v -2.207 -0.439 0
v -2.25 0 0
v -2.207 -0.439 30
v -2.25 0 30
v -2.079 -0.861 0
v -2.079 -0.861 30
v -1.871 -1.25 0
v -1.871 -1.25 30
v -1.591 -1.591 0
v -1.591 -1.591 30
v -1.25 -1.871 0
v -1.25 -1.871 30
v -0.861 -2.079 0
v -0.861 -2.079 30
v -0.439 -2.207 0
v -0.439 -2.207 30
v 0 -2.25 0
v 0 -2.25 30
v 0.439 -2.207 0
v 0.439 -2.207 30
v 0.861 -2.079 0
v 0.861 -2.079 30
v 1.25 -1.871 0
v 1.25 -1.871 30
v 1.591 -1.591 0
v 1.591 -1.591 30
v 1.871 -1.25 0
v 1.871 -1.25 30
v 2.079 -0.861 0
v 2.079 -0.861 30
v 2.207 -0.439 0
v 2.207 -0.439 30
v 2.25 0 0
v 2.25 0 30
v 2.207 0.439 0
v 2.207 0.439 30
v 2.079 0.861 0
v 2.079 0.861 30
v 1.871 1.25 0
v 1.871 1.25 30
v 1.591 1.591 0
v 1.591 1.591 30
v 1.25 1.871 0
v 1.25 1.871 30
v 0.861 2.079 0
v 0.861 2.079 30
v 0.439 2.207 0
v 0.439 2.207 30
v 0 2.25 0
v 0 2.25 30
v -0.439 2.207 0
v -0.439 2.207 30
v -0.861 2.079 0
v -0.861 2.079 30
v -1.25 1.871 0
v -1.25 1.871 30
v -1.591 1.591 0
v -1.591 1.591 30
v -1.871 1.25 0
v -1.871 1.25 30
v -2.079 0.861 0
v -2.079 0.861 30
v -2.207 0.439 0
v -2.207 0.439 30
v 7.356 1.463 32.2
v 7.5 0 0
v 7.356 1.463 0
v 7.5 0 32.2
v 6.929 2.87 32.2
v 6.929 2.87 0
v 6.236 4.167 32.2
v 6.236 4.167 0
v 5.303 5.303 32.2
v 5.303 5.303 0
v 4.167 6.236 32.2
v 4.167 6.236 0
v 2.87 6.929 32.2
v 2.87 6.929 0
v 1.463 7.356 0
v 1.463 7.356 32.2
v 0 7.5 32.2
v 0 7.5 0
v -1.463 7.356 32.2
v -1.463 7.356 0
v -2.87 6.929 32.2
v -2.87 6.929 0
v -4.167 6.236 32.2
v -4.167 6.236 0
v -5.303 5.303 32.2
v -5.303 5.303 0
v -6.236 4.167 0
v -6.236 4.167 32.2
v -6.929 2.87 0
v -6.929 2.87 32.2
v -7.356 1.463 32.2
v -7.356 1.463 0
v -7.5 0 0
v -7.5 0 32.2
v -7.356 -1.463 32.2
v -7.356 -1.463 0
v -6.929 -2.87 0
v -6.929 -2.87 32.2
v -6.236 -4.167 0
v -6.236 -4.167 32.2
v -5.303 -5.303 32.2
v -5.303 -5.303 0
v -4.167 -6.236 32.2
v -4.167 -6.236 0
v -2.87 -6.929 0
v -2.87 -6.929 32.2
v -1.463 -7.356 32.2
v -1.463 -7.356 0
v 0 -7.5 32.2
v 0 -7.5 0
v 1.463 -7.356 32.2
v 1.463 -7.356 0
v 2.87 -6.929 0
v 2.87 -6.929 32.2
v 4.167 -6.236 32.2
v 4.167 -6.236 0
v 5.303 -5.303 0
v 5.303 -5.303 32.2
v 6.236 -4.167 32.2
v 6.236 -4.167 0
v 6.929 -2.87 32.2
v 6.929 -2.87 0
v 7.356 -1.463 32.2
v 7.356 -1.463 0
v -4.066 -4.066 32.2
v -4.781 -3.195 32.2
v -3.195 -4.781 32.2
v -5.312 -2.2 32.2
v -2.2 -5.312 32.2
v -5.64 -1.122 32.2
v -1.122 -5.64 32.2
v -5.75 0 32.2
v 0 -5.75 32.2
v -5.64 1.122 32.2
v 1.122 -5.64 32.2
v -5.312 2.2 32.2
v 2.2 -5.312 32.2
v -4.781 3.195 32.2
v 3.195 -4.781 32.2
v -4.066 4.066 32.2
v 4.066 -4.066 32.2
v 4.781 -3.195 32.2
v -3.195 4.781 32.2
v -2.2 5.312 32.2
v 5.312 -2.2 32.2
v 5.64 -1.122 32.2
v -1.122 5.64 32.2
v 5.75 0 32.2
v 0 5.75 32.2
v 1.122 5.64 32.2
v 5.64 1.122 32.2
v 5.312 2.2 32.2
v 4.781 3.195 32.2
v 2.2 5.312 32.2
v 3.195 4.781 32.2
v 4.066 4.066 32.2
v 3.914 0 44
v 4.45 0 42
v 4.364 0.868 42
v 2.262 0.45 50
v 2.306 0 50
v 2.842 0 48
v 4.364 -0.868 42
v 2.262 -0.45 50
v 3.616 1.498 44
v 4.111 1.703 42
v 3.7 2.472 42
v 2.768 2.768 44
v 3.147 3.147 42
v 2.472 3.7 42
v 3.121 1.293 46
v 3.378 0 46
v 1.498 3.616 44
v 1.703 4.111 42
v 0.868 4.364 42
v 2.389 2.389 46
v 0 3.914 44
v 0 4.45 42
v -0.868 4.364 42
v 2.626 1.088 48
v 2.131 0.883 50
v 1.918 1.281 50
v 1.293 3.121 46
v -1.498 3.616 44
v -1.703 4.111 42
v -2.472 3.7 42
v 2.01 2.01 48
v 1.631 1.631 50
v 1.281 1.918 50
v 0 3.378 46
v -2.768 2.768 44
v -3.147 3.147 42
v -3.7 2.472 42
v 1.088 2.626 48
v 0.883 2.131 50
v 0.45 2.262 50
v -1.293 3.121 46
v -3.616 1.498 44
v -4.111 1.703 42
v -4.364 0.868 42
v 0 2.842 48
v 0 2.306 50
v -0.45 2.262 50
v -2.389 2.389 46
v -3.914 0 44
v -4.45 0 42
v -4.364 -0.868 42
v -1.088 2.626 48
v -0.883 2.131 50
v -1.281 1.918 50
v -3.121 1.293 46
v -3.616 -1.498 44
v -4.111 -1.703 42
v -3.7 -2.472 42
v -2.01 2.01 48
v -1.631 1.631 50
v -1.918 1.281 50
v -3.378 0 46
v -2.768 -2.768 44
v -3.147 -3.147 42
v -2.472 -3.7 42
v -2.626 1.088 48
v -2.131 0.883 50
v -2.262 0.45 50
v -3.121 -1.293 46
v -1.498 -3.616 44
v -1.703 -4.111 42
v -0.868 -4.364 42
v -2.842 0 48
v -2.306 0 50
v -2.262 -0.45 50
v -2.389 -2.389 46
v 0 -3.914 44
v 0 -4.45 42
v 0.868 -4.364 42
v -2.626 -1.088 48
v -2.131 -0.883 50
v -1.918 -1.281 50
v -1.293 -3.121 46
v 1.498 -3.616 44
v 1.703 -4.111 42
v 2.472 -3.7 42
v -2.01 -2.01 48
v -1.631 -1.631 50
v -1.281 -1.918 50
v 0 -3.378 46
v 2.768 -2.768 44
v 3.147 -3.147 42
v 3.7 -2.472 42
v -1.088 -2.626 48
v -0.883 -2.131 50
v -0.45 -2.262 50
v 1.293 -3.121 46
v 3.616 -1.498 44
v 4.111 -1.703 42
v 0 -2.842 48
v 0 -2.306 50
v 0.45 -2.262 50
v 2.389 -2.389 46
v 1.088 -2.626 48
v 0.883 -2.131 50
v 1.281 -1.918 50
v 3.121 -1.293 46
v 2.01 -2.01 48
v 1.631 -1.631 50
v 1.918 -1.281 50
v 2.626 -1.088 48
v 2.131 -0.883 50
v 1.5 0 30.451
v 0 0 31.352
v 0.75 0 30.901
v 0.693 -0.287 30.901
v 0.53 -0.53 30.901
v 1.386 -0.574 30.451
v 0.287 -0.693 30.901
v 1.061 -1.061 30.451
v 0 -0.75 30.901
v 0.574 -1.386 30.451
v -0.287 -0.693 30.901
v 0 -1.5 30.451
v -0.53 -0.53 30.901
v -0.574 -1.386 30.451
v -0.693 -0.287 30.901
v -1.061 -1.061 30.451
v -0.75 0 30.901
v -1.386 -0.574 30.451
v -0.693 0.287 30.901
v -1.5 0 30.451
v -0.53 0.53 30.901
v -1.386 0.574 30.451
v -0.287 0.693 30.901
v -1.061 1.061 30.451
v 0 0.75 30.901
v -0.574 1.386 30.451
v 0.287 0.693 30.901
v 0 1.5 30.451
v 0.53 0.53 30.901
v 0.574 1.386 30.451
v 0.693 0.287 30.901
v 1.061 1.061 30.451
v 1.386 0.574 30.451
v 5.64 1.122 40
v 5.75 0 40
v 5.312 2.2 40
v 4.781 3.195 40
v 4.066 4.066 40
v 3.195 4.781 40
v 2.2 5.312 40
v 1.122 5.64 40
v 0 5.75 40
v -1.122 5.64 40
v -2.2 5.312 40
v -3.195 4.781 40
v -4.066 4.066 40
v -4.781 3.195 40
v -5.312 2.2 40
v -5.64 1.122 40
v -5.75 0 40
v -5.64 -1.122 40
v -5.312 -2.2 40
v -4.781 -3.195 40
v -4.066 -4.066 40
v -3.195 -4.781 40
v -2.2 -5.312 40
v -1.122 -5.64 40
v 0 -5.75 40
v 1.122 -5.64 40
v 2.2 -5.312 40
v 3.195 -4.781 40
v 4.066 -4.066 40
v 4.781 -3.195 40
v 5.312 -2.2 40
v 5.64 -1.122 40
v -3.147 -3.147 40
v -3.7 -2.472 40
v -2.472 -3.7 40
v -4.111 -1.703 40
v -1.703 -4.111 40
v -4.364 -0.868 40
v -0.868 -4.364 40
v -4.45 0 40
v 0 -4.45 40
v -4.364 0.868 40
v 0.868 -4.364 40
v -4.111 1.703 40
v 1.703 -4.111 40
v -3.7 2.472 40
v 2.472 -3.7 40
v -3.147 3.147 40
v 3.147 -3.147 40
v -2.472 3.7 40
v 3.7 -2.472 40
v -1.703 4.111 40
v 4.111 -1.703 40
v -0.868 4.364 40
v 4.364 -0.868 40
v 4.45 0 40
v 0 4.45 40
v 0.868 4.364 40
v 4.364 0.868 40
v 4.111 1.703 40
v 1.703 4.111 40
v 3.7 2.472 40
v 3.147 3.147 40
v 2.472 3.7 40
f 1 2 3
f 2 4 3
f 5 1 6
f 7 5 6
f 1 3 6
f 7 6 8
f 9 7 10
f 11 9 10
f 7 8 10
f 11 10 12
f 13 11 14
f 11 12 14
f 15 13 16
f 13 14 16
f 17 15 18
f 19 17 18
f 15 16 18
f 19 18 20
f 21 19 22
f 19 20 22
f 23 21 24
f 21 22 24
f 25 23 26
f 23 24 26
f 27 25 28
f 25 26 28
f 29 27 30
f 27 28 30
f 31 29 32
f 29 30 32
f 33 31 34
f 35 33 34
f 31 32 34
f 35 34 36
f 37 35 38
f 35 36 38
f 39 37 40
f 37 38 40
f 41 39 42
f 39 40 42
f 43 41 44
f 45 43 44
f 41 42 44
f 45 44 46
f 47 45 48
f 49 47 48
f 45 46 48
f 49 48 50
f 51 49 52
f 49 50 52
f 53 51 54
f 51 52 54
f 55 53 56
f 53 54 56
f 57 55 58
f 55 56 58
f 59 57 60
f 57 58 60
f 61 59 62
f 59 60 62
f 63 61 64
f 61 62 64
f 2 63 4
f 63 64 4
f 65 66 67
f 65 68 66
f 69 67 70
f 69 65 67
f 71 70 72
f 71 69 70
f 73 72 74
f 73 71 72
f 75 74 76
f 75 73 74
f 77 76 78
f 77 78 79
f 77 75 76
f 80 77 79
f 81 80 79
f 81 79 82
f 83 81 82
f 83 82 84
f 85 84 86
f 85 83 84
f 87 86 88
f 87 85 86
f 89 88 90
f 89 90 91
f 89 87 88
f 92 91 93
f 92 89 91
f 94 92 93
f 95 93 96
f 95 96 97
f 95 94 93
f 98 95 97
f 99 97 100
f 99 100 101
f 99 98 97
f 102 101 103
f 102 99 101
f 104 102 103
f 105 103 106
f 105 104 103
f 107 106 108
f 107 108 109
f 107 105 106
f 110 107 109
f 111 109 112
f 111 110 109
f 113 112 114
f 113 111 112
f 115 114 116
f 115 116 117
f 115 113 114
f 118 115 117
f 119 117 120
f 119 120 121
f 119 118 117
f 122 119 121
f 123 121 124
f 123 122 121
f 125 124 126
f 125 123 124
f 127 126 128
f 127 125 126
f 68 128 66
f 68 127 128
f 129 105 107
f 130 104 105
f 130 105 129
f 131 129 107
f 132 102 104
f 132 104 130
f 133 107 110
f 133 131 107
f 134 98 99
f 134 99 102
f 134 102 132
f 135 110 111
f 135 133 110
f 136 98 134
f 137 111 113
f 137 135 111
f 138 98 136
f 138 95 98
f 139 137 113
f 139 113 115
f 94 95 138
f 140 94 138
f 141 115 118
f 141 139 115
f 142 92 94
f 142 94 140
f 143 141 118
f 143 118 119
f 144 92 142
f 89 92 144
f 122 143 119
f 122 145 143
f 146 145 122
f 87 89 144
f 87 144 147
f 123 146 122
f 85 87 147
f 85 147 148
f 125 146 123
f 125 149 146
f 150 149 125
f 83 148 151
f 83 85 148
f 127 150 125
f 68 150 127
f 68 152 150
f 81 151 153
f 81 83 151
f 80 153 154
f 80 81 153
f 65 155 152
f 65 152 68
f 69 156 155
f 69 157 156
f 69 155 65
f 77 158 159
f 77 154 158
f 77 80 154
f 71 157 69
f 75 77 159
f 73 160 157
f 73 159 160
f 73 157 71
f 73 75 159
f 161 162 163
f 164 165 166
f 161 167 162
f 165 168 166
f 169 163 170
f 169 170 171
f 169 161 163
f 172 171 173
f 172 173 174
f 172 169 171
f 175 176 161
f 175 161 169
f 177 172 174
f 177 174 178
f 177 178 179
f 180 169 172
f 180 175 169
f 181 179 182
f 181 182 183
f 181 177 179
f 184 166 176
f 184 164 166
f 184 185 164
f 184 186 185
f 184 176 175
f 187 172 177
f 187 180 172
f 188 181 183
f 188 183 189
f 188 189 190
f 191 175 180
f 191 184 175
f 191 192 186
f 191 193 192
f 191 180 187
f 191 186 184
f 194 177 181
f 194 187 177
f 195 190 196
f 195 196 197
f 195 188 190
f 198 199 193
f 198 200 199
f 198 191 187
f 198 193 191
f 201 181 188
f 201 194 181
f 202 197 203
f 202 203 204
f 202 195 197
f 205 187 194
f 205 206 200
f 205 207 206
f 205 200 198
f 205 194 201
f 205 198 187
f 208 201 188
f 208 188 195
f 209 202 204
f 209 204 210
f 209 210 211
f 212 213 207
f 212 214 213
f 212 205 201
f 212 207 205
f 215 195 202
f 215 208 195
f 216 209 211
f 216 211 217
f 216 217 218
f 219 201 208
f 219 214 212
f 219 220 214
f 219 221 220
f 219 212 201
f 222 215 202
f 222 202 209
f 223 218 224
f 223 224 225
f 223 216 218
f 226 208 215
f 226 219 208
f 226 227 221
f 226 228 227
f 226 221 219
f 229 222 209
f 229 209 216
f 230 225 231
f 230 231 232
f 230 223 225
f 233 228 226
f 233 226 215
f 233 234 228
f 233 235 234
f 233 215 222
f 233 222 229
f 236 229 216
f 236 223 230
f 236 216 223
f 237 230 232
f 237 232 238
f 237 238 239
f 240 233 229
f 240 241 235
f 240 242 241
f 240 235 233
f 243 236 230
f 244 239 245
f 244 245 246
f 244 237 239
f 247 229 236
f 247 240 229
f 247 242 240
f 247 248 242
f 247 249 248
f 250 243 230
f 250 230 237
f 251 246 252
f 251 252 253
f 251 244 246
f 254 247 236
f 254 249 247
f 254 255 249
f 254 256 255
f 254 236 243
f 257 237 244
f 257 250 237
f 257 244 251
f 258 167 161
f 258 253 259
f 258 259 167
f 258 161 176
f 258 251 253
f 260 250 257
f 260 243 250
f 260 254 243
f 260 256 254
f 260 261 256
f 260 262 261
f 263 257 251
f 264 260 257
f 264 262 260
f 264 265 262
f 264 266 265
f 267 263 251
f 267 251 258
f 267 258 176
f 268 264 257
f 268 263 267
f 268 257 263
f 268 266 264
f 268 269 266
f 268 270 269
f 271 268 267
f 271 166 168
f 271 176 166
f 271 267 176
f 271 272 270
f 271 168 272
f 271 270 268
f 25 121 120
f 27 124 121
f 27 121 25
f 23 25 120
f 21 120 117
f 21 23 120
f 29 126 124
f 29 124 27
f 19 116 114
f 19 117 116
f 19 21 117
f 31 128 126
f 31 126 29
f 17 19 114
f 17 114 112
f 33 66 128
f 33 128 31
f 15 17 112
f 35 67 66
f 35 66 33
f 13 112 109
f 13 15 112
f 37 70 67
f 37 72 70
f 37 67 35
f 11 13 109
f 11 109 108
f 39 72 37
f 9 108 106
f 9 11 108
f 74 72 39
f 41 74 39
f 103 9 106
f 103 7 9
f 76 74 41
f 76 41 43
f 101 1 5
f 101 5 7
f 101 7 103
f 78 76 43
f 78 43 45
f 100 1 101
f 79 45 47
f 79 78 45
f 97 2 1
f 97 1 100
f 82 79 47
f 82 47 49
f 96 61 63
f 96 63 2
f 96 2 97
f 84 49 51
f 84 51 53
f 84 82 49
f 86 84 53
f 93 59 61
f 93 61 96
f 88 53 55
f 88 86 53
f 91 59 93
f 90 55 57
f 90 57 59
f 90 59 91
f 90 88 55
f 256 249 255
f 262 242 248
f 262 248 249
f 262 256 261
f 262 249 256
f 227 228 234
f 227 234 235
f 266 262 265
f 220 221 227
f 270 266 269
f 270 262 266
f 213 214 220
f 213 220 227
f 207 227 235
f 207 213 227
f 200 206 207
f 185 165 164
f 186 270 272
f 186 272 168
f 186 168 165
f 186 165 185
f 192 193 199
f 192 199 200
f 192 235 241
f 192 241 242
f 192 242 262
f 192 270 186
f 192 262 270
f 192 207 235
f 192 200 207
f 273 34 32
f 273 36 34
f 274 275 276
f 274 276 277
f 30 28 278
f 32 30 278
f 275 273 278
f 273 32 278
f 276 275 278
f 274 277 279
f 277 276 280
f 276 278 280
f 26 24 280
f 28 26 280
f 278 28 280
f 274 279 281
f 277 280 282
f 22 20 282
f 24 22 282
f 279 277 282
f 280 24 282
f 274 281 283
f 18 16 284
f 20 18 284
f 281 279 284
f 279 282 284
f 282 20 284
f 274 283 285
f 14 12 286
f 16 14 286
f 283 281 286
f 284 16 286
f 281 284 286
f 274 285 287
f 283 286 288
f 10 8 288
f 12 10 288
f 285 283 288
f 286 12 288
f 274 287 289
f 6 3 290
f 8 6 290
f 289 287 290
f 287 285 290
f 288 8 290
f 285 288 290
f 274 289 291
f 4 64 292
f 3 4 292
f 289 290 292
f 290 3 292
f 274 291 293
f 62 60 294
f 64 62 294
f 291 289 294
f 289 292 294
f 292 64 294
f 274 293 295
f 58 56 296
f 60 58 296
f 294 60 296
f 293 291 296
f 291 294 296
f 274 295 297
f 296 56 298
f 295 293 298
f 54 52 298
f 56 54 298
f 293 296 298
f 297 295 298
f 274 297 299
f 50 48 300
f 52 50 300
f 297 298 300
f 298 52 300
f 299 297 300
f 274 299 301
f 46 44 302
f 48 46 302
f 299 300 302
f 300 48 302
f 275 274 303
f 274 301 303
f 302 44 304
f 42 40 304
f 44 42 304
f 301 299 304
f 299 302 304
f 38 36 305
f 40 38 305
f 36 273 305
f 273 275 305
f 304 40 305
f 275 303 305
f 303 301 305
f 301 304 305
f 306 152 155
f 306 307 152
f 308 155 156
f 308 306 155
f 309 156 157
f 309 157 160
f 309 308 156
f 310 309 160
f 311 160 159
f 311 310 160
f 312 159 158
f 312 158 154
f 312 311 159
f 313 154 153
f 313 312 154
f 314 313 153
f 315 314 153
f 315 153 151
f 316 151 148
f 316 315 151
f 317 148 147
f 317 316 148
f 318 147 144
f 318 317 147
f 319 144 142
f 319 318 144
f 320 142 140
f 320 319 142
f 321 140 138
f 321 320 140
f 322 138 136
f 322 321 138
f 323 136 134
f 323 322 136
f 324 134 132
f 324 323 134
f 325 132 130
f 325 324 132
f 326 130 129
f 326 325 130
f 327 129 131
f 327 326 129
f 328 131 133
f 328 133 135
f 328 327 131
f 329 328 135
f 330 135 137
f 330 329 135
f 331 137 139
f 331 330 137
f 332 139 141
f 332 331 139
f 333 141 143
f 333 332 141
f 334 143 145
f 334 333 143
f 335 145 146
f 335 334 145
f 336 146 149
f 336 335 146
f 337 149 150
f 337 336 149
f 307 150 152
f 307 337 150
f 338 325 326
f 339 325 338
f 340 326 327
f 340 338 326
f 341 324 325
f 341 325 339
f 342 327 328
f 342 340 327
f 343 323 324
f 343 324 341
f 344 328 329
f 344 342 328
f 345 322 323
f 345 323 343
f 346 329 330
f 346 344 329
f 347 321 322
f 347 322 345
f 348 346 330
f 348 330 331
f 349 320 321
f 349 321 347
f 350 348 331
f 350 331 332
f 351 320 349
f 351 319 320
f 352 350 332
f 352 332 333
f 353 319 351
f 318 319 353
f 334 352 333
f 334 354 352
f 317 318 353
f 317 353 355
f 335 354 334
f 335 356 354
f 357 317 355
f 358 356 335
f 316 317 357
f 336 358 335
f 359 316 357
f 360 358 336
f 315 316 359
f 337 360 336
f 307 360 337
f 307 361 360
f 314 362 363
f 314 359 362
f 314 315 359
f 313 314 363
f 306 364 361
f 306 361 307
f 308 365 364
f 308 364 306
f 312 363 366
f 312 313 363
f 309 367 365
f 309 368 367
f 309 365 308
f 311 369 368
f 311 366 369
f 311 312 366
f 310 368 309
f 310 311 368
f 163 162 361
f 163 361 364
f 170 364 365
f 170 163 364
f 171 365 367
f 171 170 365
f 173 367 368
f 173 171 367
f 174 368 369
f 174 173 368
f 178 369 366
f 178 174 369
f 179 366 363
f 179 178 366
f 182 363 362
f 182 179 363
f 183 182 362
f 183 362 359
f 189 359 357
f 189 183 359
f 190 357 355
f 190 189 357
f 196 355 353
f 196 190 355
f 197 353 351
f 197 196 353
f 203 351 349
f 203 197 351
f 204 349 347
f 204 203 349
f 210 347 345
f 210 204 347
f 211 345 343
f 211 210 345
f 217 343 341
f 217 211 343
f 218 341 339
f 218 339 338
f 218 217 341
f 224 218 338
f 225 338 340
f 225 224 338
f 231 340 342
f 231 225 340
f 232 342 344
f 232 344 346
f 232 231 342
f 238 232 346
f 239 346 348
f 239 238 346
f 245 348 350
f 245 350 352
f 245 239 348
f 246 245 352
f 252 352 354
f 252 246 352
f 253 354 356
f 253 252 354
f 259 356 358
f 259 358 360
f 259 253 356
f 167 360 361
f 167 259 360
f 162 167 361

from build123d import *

# Parameters (mm, degrees)
F2_SIZE2 = 2.1435935394
F2_SIZE  = 8
F4_D     = 4.5
F4_DEPTH = 30
F4_TIP   = 1.3519363928


with BuildPart() as f1:
    # F0 (on Front) → F1 (revolve)
    with BuildSketch(Plane.XZ):
        Polygon((0, 50), (0, 0), (7.5, 0), (7.5, 32.2), (5.75, 32.2), (5.75, 40), (4.45, 40), (4.45, 50), align=None)
    revolve(axis=Axis((0, 0, 25), (0, 0, 1)))

    # F2
    f2_edges = [f1.edges().sort_by_distance(p)[0] for p in [
        (-4.45, 0, 50),
    ]]
    chamfer(f2_edges, length=F2_SIZE, length2=F2_SIZE2)

    # F4
    with Locations(Plane(origin=(0, 0, 0), x_dir=(1, 0, 0), z_dir=(0, 0, -1))):
        with Locations((0, 0)):
            Hole(F4_D / 2, depth=F4_DEPTH)
            with Locations((0, 0, -(F4_DEPTH + F4_TIP / 2))):  # 118° drill point
                Cone(0, F4_D / 2, F4_TIP, mode=Mode.SUBTRACT)


solid = f1.part
